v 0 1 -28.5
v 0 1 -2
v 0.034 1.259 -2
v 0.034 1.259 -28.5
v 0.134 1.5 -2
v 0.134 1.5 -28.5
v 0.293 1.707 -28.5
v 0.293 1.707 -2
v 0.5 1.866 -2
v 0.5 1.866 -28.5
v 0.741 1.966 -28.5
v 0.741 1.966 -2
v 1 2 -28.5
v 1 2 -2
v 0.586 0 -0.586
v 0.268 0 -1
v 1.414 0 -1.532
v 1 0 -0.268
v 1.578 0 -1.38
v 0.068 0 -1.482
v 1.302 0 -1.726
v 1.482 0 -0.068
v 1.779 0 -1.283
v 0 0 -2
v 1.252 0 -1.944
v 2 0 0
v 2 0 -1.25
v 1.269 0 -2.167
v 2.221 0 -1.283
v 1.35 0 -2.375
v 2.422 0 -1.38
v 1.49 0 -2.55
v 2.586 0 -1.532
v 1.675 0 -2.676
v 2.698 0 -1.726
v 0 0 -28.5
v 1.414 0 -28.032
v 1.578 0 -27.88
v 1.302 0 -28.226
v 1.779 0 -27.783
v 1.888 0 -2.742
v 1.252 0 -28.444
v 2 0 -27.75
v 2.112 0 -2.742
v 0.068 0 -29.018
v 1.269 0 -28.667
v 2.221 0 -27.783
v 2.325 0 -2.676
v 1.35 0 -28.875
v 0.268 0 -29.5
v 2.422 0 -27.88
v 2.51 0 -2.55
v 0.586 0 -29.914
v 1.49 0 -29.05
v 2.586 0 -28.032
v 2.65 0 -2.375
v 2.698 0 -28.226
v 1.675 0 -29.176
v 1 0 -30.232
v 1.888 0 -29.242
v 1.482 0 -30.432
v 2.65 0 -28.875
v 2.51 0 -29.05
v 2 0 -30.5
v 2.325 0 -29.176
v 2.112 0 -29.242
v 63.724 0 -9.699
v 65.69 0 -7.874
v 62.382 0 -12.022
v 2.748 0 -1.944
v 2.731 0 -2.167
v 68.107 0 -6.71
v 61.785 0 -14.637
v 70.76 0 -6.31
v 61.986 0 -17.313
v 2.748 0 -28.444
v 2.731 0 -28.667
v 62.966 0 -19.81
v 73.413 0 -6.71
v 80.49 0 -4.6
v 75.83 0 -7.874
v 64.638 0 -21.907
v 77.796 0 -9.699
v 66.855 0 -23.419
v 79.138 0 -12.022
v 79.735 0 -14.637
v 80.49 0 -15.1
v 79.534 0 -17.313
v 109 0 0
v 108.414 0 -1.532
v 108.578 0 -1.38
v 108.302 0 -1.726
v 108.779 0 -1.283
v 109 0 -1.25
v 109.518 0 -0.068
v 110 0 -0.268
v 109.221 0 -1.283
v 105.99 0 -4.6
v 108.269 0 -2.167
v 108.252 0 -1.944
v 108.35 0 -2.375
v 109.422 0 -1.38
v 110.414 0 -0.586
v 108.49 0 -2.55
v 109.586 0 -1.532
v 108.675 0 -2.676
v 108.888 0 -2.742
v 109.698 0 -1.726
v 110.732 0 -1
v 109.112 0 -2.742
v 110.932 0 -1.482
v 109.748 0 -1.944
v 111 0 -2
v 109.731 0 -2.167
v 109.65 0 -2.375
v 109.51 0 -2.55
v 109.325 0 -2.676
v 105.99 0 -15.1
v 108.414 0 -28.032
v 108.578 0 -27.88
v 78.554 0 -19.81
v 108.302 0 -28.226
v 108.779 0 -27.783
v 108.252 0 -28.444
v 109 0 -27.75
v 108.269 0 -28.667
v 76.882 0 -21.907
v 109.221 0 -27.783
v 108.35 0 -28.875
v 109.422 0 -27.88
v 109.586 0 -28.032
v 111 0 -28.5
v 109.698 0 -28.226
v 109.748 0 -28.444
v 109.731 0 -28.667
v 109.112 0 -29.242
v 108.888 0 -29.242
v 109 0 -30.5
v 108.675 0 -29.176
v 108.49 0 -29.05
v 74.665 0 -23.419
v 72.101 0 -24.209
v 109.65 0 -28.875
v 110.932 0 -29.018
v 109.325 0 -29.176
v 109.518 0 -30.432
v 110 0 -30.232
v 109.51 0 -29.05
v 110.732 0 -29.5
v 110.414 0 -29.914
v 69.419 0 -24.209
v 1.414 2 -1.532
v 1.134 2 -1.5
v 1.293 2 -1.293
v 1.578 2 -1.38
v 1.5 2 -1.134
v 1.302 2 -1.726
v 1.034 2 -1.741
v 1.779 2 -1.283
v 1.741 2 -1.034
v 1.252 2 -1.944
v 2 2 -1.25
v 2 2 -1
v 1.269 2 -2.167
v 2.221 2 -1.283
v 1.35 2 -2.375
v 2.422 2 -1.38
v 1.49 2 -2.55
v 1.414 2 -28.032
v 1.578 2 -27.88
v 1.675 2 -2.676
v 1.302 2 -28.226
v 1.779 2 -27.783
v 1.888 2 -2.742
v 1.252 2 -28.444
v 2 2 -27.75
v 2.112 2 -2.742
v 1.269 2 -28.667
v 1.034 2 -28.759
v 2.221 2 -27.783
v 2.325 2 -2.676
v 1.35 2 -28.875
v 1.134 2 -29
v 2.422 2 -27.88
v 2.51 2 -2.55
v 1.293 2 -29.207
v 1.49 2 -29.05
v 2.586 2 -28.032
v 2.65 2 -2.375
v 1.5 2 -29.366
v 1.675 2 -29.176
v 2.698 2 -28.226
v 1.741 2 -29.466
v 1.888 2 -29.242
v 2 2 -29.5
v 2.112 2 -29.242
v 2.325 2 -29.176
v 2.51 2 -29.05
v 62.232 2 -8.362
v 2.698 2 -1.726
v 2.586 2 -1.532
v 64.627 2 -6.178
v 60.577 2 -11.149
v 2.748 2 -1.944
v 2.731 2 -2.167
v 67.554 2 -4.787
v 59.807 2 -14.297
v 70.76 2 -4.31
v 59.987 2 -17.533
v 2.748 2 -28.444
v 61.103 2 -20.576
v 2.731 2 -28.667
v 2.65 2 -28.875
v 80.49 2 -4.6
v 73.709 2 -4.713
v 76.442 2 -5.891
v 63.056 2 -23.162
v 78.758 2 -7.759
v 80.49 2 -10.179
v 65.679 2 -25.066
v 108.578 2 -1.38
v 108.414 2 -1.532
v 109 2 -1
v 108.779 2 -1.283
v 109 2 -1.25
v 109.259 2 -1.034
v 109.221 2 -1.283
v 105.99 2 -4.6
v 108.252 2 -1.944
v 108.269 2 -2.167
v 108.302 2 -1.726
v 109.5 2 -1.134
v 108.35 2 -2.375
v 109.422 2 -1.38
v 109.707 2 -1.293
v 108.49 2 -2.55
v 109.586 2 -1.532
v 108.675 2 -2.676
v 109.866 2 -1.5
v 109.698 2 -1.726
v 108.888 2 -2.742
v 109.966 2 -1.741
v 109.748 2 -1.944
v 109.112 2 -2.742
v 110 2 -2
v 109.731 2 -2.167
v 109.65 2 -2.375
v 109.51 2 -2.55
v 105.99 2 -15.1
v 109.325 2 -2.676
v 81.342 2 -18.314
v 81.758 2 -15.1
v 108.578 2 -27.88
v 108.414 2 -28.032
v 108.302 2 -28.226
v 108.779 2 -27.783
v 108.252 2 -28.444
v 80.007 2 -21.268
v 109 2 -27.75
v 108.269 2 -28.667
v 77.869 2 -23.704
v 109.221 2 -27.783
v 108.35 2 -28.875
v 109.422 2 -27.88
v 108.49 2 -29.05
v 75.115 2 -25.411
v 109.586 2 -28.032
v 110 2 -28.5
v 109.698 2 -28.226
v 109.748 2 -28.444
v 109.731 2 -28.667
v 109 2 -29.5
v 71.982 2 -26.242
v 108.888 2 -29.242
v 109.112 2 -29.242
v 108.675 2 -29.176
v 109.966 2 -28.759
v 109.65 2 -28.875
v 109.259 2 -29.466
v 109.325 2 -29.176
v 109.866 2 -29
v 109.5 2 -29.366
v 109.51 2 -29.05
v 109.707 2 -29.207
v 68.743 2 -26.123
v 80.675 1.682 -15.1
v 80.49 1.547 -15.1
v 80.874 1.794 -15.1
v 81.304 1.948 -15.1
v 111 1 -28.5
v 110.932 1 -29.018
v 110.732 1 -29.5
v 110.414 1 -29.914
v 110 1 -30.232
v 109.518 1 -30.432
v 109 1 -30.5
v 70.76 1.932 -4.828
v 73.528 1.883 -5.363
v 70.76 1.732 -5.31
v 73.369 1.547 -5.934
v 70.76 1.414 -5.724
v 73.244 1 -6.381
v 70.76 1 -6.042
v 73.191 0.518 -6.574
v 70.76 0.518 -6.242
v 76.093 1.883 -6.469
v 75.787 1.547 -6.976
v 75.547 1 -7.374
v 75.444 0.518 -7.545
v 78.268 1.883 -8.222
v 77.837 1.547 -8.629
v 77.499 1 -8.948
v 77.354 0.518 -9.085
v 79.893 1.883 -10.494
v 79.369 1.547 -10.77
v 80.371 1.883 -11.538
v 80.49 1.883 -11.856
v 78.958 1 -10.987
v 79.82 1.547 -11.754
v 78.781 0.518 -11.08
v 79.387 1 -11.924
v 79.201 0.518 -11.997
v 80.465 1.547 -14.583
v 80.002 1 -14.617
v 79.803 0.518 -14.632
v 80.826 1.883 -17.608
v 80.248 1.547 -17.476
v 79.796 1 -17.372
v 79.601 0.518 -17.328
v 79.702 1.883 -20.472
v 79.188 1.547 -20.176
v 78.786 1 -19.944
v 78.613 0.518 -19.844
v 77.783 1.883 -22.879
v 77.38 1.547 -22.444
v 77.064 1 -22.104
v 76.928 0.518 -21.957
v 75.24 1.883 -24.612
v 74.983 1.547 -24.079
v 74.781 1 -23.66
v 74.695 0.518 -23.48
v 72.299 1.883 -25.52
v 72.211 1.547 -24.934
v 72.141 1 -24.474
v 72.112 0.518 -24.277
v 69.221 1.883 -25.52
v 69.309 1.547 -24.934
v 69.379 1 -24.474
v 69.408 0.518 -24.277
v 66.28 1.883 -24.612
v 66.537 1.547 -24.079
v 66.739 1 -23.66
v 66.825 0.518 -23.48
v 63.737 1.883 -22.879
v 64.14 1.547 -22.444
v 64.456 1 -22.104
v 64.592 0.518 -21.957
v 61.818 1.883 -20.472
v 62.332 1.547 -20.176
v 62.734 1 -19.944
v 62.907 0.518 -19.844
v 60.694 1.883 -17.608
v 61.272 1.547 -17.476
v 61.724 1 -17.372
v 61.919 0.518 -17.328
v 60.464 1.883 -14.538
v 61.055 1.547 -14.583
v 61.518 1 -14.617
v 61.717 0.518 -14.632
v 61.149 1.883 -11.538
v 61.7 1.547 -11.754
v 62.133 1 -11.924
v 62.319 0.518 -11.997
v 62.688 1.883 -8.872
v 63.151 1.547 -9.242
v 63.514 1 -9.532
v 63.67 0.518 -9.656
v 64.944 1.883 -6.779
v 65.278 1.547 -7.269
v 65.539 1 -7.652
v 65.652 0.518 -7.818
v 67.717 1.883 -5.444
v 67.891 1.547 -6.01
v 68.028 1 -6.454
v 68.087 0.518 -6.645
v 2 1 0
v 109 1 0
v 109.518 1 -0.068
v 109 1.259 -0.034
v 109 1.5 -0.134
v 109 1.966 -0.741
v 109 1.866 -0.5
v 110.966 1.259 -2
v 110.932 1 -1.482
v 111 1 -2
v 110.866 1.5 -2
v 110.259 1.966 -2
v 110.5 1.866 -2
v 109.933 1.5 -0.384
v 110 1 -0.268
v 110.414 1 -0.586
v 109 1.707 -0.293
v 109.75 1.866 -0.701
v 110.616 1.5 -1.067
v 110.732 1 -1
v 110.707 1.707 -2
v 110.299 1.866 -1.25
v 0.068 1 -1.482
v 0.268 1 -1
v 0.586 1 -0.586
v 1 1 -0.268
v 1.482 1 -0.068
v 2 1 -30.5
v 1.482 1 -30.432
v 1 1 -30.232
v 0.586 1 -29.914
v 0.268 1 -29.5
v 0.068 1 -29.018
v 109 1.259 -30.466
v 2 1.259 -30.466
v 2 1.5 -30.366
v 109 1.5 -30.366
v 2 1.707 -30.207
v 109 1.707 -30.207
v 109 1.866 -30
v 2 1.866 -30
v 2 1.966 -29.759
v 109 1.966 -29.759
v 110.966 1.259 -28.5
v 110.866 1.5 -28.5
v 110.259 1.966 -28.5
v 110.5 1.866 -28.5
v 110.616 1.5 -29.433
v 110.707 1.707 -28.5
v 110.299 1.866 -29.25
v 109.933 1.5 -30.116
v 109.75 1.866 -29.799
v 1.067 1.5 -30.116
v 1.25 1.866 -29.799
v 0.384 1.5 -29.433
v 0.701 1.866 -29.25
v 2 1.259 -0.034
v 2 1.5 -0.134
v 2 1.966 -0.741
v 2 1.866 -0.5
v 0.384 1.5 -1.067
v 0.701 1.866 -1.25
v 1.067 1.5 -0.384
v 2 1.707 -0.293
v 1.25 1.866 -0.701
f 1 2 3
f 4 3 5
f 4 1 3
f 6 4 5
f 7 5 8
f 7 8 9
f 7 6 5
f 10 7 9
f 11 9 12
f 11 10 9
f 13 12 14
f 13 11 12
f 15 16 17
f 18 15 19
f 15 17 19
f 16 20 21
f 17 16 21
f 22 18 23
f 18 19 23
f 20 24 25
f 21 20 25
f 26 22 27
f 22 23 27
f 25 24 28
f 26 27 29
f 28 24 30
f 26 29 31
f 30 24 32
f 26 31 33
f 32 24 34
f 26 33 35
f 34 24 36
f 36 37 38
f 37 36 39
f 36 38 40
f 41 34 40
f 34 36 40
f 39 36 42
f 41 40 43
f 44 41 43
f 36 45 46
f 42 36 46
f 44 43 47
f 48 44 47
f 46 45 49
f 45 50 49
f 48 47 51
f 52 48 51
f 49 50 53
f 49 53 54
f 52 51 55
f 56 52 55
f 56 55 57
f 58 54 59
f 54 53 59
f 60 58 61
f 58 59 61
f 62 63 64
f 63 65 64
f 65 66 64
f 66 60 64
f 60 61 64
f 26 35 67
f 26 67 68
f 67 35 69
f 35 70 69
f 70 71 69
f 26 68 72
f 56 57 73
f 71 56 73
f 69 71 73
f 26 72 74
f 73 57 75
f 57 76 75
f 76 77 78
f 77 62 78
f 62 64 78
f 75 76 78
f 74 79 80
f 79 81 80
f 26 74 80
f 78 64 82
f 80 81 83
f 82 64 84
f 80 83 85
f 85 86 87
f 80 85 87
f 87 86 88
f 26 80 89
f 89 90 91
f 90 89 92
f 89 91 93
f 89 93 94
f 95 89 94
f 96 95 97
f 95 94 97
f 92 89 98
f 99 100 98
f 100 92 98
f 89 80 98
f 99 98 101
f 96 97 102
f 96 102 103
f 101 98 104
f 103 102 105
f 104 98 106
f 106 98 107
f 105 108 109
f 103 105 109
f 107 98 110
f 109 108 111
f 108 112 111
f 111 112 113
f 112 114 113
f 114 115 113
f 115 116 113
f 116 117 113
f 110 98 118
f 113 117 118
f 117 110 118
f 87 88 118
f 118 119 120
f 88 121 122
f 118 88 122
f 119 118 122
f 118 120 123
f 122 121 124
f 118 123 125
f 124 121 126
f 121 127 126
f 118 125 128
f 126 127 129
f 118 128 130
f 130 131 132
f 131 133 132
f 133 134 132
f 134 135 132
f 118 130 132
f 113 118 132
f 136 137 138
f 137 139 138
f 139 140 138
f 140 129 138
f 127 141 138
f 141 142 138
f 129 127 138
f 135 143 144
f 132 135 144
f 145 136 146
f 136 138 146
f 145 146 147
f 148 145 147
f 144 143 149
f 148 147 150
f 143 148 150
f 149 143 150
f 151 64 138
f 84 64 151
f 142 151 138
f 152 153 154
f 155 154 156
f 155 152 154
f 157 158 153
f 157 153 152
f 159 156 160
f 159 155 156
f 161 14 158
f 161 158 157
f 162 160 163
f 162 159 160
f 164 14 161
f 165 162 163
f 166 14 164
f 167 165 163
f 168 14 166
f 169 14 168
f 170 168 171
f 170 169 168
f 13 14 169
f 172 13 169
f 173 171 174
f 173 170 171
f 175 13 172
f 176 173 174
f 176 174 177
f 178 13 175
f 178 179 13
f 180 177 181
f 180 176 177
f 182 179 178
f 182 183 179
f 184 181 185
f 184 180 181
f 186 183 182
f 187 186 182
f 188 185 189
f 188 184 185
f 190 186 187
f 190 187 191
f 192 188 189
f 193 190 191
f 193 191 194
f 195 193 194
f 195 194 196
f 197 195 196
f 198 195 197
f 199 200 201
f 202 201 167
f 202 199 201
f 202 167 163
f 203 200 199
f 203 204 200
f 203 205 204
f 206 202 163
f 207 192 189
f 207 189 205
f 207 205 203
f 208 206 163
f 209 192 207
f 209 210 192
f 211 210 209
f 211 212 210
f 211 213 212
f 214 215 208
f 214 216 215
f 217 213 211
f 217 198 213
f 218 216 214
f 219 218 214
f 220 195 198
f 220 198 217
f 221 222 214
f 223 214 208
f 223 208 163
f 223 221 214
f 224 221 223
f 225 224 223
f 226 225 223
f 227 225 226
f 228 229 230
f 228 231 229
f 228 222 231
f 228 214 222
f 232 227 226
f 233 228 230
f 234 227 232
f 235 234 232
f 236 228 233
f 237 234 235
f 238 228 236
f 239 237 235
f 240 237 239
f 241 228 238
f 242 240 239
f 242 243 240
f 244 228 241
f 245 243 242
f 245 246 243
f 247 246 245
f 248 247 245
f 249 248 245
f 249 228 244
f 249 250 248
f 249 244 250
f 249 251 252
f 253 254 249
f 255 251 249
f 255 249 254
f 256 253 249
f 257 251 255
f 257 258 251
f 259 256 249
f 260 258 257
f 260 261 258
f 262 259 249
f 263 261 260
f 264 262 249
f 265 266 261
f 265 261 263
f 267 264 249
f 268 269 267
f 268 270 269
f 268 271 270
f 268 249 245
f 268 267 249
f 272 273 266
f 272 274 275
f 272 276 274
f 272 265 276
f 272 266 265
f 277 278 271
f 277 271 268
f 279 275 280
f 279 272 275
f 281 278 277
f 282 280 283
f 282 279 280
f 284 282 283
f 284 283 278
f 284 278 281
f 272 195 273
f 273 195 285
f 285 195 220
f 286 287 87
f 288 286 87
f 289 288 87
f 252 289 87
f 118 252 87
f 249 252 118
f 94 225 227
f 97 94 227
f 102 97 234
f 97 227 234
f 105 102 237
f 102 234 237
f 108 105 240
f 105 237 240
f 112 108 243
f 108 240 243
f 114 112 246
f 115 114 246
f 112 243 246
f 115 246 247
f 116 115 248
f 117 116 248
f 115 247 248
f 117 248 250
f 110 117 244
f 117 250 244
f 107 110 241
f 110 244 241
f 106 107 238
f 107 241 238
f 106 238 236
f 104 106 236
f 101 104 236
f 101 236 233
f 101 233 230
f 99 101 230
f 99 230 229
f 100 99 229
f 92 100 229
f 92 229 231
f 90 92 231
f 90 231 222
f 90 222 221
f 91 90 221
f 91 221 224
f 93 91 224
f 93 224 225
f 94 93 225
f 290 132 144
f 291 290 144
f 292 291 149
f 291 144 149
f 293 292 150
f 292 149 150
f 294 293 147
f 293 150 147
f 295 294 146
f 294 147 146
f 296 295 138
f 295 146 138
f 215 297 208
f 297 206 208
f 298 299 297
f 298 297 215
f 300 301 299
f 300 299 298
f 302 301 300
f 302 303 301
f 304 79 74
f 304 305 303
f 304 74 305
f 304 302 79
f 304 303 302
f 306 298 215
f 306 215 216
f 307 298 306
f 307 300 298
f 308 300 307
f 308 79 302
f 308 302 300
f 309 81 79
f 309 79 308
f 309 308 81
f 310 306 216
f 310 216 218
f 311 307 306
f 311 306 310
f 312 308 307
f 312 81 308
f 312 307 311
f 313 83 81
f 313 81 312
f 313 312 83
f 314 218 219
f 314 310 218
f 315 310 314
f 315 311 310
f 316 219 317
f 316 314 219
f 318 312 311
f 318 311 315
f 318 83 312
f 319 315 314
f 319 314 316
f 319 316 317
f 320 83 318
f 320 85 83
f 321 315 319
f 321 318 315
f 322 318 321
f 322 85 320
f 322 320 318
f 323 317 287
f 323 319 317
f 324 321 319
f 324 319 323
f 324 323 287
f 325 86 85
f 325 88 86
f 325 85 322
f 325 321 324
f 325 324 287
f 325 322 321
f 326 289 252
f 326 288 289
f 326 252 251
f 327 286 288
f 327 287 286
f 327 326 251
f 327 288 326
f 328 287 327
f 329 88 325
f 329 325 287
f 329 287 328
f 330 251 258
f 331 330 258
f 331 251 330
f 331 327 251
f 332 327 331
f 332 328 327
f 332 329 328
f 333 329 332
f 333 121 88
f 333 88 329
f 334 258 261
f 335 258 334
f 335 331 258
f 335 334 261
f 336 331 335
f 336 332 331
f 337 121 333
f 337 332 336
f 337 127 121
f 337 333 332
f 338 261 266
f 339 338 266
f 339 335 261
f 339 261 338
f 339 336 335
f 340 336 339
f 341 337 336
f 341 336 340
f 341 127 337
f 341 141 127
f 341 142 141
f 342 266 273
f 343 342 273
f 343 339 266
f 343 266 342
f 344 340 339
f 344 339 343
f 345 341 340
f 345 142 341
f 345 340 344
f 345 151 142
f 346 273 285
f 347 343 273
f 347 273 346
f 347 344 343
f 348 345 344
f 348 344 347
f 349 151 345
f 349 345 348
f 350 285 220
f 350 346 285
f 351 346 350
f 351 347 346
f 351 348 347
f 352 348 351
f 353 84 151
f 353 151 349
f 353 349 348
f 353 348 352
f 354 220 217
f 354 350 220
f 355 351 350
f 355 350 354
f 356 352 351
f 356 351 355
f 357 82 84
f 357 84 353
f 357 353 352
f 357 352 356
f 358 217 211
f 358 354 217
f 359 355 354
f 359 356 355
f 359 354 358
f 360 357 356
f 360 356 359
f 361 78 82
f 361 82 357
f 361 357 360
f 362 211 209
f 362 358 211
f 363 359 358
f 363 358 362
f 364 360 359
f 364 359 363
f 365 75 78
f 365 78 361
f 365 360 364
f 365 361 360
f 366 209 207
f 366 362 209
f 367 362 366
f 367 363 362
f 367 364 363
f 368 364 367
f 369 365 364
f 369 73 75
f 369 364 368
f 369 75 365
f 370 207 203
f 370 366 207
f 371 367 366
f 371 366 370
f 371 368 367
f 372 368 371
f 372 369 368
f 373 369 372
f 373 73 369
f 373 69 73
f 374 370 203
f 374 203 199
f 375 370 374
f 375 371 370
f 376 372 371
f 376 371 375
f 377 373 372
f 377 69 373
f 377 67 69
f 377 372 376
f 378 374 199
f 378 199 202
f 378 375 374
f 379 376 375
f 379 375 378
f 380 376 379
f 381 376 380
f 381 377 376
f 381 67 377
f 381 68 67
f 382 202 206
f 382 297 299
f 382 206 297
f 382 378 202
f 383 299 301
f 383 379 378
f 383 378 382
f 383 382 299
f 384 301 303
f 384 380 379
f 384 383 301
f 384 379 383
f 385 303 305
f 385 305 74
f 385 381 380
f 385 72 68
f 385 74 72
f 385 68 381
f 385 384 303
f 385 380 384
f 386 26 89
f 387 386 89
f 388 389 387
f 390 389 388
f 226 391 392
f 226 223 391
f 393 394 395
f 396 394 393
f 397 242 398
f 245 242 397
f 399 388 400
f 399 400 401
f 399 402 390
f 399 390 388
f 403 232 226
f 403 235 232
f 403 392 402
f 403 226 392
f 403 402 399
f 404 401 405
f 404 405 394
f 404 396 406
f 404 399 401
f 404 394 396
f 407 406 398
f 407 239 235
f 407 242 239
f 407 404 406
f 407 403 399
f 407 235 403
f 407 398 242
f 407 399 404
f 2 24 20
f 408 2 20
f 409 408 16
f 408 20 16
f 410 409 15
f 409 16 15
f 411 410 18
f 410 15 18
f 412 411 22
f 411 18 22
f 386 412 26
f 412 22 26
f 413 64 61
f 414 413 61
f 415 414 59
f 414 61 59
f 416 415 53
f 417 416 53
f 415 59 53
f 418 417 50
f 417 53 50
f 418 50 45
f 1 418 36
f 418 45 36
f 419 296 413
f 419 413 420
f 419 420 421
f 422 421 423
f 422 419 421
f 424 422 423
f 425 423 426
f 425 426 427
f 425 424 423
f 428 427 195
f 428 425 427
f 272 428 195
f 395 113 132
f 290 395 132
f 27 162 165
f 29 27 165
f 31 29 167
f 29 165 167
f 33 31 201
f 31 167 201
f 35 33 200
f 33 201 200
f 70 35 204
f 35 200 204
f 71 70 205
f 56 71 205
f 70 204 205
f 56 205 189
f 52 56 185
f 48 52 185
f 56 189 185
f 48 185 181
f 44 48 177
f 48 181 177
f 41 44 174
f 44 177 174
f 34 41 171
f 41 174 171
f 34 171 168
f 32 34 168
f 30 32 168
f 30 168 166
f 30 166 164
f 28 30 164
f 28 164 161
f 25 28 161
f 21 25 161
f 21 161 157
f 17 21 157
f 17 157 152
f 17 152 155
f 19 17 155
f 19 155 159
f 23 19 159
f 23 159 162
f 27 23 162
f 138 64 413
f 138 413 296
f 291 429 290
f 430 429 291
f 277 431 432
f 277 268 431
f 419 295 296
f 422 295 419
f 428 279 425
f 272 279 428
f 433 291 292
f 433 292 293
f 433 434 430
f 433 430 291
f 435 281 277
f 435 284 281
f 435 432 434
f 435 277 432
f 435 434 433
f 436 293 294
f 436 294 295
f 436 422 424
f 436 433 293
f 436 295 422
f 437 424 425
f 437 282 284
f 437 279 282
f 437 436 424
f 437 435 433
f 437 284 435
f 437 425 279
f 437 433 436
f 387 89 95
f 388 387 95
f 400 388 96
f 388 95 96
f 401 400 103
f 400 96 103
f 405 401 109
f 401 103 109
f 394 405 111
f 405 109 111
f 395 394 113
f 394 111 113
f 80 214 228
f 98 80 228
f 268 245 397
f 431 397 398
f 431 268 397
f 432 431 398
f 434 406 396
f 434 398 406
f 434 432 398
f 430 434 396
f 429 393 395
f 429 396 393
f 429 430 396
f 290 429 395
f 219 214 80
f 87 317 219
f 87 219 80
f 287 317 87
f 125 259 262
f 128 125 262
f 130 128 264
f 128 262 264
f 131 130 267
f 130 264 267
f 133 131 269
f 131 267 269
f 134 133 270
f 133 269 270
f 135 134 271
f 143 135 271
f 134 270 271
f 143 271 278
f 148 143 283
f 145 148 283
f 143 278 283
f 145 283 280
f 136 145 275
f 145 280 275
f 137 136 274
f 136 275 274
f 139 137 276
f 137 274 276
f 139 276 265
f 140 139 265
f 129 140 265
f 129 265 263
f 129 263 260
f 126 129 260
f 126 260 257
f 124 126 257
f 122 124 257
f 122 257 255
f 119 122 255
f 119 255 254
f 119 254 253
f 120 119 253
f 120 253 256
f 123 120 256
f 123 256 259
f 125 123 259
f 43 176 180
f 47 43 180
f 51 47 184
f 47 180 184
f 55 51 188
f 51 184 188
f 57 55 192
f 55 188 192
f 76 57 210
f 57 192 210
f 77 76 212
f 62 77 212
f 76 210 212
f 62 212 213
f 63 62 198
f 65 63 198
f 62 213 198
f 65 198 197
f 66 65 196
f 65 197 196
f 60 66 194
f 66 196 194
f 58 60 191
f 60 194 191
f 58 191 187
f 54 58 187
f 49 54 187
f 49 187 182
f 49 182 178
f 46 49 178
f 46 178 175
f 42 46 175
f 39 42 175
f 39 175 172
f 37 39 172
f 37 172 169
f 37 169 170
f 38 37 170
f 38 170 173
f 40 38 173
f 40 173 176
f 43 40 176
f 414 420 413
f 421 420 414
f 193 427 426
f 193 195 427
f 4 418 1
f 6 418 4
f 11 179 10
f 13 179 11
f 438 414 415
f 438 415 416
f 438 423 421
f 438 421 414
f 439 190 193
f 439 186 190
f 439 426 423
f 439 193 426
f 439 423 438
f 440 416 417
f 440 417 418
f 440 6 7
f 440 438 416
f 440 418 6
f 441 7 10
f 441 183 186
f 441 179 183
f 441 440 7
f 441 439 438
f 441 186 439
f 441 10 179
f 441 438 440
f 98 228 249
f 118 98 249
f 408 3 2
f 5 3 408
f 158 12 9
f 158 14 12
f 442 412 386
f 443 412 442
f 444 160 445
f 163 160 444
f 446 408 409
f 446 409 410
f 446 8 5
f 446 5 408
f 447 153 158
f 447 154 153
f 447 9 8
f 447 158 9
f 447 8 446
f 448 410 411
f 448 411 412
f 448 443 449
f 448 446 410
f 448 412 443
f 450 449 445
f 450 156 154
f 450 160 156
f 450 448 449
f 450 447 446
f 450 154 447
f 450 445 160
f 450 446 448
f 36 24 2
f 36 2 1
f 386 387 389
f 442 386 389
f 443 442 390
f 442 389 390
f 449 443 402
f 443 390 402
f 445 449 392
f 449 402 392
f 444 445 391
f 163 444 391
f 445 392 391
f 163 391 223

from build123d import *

# Parameters (mm, degrees)
SKETCH1_W           = 111
SKETCH1_H           = 30.5
BOSS_EXTRUDE1_DEPTH = 2
SKETCH2_R           = 0.75
SKETCH2_R_2         = 9
SKETCH2_W           = 25.5
SKETCH2_H           = 10.5
CUT_EXTRUDE1_DEPTH  = 116.131446616
FILLET1_R           = 1
FILLET2_R           = 2


with BuildPart() as part:
    # Sketch1 → Boss-Extrude1 (new body)
    with BuildSketch(Plane(origin=(0, 0, 0), x_dir=(1, 0, 0), z_dir=(0, 1, 0))):
        with Locations((55.5, 15.25)):
            Rectangle(SKETCH1_W, SKETCH1_H)
    extrude(amount=BOSS_EXTRUDE1_DEPTH)

    # Sketch2 → Cut-Extrude1 (cut, through all)
    with BuildSketch(Plane(origin=(0, 2, 0), x_dir=(1, 0, 0), z_dir=(0, 1, 0))):
        with Locations(Location((2, 28.5, 0), (0, 0, 270))):
            Circle(SKETCH2_R)
        with Locations(Location((2, 2, 0), (0, 0, 270))):
            Circle(SKETCH2_R)
        with Locations(Location((109, 2, 0), (0, 0, 270))):
            Circle(SKETCH2_R)
        with Locations(Location((109, 28.5, 0), (0, 0, 270))):
            Circle(SKETCH2_R)
        with Locations(Location((70.76, 15.31, 0), (0, 0, 270))):
            Circle(SKETCH2_R_2)
        with Locations((93.24, 9.85)):
            Rectangle(SKETCH2_W, SKETCH2_H)
    extrude(amount=-CUT_EXTRUDE1_DEPTH, mode=Mode.SUBTRACT)

    # Fillet1
    fillet1_edges = [part.edges().sort_by_distance(p)[0] for p in [
        (111, 2, -15.25),
        (55.5, 2, -30.5),
        (0, 2, -15.25),
        (55.5, 2, 0),
    ]]
    fillet(fillet1_edges, radius=FILLET1_R)

    # Fillet2
    # the kernel refuses this fillet: 2 mm, written as the material it takes off along each edge
    with BuildSketch(Plane(origin=(109, 2, -2), x_dir=(0, 0, 1), z_dir=(-1, 0, 0))) as fillet2_piece_1:
        with BuildLine():
            CenterArc((1, -1), 1, 0, 90)
            Line((2, -1), (2, 0))
            Line((2, 0), (1, 0))
        make_face()
    revolve(axis=Axis((109, 2, -2), (0, 1, 0)), revolution_arc=90, mode=Mode.SUBTRACT)
    with BuildSketch(Plane(origin=(2, 2, -2), x_dir=(-1, 0, 0), z_dir=(0, 0, -1))) as fillet2_piece_2:
        with BuildLine():
            CenterArc((1, -1), 1, 0, 90)
            Line((2, -1), (2, 0))
            Line((2, 0), (1, 0))
        make_face()
    revolve(axis=Axis((2, 2, -2), (0, 1, 0)), revolution_arc=90, mode=Mode.SUBTRACT)
    with BuildSketch(Plane(origin=(109, 2, -28.5), x_dir=(1, 0, 0), z_dir=(0, 0, 1))) as fillet2_piece_3:
        with BuildLine():
            CenterArc((1, -1), 1, 0, 90)
            Line((2, -1), (2, 0))
            Line((2, 0), (1, 0))
        make_face()
    revolve(axis=Axis((109, 2, -28.5), (0, 1, 0)), revolution_arc=90, mode=Mode.SUBTRACT)
    with BuildSketch(Plane(origin=(2, 2, -28.5), x_dir=(0, 0, -1), z_dir=(1, 0, 0))) as fillet2_piece_4:
        with BuildLine():
            CenterArc((1, -1), 1, 0, 90)
            Line((2, -1), (2, 0))
            Line((2, 0), (1, 0))
        make_face()
    revolve(axis=Axis((2, 2, -28.5), (0, 1, 0)), revolution_arc=90, mode=Mode.SUBTRACT)
    with BuildSketch(Plane(origin=(70.76, 2, -15.31), x_dir=(0, 0, 1), z_dir=(-1, 0, 0))) as fillet2_piece_5:
        with BuildLine():
            CenterArc((9 + FILLET2_R, -FILLET2_R), FILLET2_R, 90, 90)
            Line((9, -FILLET2_R), (9, 0))
            Line((9, 0), (9 + FILLET2_R, 0))
        make_face()
    revolve(axis=Axis((70.76, 2, -15.31), (0, 1, 0)), mode=Mode.SUBTRACT)
    with BuildSketch(Plane(origin=(0, -5, -30.5), x_dir=(0, 0, 1), z_dir=(0, 1, 0)), Plane(origin=(0, -5, 0), x_dir=(1, 0, 0), z_dir=(0, 1, 0))) as fillet2_piece_6:
        with BuildLine():
            CenterArc((FILLET2_R, FILLET2_R), FILLET2_R, 180, 90)
            Line((0, FILLET2_R), (0, 0))
            Line((0, 0), (FILLET2_R, 0))
        make_face()
    extrude(amount=7, mode=Mode.SUBTRACT)
    with BuildSketch(Plane(origin=(111, -5, -30.5), x_dir=(0, 0, 1), z_dir=(0, 1, 0)), Plane(origin=(111, -5, 0), x_dir=(-1, 0, 0), z_dir=(0, 1, 0))) as fillet2_piece_7:
        with BuildLine():
            CenterArc((FILLET2_R, -FILLET2_R), FILLET2_R, 90, 90)
            Line((0, -FILLET2_R), (0, 0))
            Line((0, 0), (FILLET2_R, 0))
        make_face()
    extrude(amount=7, mode=Mode.SUBTRACT)


solid = part.part
